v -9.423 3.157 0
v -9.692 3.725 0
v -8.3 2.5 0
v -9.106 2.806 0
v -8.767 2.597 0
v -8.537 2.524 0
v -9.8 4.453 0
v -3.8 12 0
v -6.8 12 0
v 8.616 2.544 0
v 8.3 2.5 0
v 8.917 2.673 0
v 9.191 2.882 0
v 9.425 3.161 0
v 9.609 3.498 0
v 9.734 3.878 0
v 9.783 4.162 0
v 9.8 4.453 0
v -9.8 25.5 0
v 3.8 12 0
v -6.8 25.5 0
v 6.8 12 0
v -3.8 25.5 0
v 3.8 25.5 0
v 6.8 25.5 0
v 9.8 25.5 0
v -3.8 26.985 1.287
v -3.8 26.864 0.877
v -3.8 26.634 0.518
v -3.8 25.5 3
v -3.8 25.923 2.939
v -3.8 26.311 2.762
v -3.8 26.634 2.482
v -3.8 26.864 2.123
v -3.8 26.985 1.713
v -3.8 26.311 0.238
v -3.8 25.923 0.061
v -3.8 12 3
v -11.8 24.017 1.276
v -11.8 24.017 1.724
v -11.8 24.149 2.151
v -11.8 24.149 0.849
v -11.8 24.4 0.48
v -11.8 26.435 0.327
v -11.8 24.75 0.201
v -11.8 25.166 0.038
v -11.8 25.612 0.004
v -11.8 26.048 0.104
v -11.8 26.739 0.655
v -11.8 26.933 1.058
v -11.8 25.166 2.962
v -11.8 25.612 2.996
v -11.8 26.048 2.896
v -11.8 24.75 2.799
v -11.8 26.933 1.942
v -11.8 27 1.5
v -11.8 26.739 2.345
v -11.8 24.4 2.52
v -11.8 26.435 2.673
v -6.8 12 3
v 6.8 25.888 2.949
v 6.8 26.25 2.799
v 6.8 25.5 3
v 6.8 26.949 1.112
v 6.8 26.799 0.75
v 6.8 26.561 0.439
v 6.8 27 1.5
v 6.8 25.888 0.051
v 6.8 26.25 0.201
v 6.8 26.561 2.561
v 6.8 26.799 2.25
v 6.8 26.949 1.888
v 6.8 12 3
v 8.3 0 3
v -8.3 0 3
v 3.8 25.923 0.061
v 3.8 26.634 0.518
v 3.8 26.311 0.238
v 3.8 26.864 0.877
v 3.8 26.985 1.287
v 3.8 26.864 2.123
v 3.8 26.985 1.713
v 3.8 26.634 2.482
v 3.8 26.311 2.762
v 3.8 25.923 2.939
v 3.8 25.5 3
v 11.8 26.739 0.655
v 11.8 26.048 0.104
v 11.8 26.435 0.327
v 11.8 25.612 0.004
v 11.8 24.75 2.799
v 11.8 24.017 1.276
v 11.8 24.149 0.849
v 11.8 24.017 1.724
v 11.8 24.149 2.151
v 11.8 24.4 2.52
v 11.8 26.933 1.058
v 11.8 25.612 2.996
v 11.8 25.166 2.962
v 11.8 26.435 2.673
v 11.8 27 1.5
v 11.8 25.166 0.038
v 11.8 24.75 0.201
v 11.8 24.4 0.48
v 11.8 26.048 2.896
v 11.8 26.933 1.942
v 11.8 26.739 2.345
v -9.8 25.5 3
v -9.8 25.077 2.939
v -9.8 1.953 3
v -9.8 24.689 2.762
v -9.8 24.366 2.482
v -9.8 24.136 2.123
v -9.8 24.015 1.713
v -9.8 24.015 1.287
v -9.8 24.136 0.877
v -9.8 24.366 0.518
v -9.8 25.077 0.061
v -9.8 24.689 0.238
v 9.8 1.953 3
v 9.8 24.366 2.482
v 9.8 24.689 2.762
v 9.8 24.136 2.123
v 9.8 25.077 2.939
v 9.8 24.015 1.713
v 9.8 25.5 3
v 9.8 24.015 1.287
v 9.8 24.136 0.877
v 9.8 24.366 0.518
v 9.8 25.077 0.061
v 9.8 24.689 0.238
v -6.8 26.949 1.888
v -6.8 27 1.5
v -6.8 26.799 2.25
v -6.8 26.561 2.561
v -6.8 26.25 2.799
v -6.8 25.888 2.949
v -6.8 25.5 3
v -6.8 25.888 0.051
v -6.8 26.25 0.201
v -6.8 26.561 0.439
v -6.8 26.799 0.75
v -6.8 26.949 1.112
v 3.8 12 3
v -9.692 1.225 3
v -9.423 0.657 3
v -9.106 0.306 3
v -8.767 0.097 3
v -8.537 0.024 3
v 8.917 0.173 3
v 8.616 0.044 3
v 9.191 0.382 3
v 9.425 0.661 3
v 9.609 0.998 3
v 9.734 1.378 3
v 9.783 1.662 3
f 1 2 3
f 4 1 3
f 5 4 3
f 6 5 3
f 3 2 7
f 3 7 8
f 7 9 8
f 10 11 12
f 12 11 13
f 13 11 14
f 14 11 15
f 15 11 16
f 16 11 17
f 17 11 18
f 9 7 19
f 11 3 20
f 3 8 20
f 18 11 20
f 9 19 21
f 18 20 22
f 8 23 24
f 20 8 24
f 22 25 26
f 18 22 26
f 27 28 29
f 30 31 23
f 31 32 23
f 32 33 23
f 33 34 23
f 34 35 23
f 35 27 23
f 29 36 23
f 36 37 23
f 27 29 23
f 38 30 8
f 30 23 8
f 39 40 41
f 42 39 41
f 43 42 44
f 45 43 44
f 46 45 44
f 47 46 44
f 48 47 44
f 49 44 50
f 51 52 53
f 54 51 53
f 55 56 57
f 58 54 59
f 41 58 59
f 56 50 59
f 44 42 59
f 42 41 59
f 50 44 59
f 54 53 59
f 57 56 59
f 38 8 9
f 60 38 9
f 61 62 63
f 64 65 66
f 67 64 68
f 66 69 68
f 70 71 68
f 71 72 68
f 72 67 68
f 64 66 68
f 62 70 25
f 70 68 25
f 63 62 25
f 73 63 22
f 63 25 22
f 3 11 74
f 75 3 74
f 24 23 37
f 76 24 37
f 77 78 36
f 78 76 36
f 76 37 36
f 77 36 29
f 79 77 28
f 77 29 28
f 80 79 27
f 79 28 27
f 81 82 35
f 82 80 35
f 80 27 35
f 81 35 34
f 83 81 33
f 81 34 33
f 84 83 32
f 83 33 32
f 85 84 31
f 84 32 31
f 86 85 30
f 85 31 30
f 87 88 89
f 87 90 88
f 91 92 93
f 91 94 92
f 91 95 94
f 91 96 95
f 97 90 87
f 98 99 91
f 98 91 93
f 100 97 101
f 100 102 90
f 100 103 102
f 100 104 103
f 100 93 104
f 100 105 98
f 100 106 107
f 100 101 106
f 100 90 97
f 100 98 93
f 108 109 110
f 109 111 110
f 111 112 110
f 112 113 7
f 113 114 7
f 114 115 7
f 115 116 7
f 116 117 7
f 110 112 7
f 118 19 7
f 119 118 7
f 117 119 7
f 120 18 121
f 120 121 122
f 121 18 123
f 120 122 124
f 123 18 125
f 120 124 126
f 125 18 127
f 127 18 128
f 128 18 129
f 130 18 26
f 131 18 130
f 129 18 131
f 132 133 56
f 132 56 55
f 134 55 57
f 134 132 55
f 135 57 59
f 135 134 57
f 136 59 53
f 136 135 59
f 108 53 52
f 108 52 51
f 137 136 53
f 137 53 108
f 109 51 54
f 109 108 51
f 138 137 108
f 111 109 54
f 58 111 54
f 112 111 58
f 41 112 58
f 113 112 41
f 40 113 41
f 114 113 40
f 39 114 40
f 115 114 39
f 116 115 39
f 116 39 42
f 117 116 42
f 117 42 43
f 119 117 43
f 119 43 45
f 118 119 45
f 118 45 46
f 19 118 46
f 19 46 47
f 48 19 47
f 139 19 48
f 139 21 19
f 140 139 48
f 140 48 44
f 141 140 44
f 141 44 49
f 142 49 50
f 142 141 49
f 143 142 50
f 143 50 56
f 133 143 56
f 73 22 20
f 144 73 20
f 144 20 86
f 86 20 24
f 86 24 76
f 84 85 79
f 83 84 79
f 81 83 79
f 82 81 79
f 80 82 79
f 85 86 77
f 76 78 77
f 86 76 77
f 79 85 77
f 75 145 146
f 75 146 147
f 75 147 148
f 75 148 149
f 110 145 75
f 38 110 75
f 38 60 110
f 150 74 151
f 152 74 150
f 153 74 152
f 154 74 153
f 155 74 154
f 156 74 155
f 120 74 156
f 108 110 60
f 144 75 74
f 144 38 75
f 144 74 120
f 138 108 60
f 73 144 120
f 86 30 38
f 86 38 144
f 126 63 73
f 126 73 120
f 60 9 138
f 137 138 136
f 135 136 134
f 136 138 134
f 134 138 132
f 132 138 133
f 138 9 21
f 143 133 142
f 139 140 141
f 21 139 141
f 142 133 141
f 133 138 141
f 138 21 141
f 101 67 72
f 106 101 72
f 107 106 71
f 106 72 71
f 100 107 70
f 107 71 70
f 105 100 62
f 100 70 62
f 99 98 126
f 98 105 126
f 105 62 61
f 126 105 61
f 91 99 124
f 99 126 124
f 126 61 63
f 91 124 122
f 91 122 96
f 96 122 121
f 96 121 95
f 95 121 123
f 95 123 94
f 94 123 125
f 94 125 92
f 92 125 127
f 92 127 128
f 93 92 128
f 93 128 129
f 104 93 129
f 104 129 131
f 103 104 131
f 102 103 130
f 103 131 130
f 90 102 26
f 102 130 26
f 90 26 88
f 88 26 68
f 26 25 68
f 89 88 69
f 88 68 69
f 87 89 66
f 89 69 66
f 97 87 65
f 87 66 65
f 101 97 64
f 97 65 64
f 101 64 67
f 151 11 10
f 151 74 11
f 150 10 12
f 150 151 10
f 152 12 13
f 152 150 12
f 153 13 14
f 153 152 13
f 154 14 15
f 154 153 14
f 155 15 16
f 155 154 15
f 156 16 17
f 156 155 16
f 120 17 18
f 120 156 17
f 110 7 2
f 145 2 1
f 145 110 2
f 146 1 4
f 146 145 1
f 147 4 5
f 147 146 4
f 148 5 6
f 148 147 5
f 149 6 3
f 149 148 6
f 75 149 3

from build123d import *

# Parameters (mm, degrees)
F1_DEPTH = 3
F2_R     = 1.5
F3_DEPTH = 2
F6_DEPTH = 25
F8_DEPTH = 25
F9_R     = 1.5


with BuildPart() as f1:
    # F0 (on Top) → F1 (new body)
    with BuildSketch(Plane.XY):
        Polygon((-9.8, 27), (-9.8, 0), (9.8, 0), (9.8, 27), (6.8, 27), (6.8, 12), (3.8, 12), (3.8, 27), (-3.8, 27), (-3.8, 12), (-6.8, 12), (-6.8, 27), align=None)
    extrude(amount=F1_DEPTH)

    # F2 (on face) → F3 (join)
    with BuildSketch(Plane.YZ.offset(9.8)):
        with Locations((25.5, 1.5)):
            Circle(F2_R)
    extrude(amount=F3_DEPTH)

    # F5: F1 across plane


with BuildPart() as f1_1:
    add(f1.part)
    add(f1.part.mirror(Plane(origin=(0, 12.8316278075, 1.5), x_dir=(0, 1, 0), z_dir=(1, 0, 0))))

    # F6 (cut): faces of the model
    f6_faces = [f1_1.faces().sort_by_distance(p)[0] for p in [
        (-9.8, 26.6649480916, 0.3350519084),
        (-9.8, 26.6649480916, 2.6649480916),
    ]]
    extrude(f6_faces, amount=-F6_DEPTH, mode=Mode.SUBTRACT)

    # F7 (on face) → F8 (cut)
    with BuildSketch(Plane.YZ.offset(9.8)):
        Polygon((0, 3), (0, 0), (2.5, 0), align=None)
    extrude(amount=-F8_DEPTH, mode=Mode.SUBTRACT)

    # F9
    f9_edges = [f1_1.edges().sort_by_distance(p)[0] for p in [
        (-9.8, 1.25, 1.5),
        (9.8, 1.25, 1.5),
    ]]
    fillet(f9_edges, radius=F9_R)


solid = f1_1.part
